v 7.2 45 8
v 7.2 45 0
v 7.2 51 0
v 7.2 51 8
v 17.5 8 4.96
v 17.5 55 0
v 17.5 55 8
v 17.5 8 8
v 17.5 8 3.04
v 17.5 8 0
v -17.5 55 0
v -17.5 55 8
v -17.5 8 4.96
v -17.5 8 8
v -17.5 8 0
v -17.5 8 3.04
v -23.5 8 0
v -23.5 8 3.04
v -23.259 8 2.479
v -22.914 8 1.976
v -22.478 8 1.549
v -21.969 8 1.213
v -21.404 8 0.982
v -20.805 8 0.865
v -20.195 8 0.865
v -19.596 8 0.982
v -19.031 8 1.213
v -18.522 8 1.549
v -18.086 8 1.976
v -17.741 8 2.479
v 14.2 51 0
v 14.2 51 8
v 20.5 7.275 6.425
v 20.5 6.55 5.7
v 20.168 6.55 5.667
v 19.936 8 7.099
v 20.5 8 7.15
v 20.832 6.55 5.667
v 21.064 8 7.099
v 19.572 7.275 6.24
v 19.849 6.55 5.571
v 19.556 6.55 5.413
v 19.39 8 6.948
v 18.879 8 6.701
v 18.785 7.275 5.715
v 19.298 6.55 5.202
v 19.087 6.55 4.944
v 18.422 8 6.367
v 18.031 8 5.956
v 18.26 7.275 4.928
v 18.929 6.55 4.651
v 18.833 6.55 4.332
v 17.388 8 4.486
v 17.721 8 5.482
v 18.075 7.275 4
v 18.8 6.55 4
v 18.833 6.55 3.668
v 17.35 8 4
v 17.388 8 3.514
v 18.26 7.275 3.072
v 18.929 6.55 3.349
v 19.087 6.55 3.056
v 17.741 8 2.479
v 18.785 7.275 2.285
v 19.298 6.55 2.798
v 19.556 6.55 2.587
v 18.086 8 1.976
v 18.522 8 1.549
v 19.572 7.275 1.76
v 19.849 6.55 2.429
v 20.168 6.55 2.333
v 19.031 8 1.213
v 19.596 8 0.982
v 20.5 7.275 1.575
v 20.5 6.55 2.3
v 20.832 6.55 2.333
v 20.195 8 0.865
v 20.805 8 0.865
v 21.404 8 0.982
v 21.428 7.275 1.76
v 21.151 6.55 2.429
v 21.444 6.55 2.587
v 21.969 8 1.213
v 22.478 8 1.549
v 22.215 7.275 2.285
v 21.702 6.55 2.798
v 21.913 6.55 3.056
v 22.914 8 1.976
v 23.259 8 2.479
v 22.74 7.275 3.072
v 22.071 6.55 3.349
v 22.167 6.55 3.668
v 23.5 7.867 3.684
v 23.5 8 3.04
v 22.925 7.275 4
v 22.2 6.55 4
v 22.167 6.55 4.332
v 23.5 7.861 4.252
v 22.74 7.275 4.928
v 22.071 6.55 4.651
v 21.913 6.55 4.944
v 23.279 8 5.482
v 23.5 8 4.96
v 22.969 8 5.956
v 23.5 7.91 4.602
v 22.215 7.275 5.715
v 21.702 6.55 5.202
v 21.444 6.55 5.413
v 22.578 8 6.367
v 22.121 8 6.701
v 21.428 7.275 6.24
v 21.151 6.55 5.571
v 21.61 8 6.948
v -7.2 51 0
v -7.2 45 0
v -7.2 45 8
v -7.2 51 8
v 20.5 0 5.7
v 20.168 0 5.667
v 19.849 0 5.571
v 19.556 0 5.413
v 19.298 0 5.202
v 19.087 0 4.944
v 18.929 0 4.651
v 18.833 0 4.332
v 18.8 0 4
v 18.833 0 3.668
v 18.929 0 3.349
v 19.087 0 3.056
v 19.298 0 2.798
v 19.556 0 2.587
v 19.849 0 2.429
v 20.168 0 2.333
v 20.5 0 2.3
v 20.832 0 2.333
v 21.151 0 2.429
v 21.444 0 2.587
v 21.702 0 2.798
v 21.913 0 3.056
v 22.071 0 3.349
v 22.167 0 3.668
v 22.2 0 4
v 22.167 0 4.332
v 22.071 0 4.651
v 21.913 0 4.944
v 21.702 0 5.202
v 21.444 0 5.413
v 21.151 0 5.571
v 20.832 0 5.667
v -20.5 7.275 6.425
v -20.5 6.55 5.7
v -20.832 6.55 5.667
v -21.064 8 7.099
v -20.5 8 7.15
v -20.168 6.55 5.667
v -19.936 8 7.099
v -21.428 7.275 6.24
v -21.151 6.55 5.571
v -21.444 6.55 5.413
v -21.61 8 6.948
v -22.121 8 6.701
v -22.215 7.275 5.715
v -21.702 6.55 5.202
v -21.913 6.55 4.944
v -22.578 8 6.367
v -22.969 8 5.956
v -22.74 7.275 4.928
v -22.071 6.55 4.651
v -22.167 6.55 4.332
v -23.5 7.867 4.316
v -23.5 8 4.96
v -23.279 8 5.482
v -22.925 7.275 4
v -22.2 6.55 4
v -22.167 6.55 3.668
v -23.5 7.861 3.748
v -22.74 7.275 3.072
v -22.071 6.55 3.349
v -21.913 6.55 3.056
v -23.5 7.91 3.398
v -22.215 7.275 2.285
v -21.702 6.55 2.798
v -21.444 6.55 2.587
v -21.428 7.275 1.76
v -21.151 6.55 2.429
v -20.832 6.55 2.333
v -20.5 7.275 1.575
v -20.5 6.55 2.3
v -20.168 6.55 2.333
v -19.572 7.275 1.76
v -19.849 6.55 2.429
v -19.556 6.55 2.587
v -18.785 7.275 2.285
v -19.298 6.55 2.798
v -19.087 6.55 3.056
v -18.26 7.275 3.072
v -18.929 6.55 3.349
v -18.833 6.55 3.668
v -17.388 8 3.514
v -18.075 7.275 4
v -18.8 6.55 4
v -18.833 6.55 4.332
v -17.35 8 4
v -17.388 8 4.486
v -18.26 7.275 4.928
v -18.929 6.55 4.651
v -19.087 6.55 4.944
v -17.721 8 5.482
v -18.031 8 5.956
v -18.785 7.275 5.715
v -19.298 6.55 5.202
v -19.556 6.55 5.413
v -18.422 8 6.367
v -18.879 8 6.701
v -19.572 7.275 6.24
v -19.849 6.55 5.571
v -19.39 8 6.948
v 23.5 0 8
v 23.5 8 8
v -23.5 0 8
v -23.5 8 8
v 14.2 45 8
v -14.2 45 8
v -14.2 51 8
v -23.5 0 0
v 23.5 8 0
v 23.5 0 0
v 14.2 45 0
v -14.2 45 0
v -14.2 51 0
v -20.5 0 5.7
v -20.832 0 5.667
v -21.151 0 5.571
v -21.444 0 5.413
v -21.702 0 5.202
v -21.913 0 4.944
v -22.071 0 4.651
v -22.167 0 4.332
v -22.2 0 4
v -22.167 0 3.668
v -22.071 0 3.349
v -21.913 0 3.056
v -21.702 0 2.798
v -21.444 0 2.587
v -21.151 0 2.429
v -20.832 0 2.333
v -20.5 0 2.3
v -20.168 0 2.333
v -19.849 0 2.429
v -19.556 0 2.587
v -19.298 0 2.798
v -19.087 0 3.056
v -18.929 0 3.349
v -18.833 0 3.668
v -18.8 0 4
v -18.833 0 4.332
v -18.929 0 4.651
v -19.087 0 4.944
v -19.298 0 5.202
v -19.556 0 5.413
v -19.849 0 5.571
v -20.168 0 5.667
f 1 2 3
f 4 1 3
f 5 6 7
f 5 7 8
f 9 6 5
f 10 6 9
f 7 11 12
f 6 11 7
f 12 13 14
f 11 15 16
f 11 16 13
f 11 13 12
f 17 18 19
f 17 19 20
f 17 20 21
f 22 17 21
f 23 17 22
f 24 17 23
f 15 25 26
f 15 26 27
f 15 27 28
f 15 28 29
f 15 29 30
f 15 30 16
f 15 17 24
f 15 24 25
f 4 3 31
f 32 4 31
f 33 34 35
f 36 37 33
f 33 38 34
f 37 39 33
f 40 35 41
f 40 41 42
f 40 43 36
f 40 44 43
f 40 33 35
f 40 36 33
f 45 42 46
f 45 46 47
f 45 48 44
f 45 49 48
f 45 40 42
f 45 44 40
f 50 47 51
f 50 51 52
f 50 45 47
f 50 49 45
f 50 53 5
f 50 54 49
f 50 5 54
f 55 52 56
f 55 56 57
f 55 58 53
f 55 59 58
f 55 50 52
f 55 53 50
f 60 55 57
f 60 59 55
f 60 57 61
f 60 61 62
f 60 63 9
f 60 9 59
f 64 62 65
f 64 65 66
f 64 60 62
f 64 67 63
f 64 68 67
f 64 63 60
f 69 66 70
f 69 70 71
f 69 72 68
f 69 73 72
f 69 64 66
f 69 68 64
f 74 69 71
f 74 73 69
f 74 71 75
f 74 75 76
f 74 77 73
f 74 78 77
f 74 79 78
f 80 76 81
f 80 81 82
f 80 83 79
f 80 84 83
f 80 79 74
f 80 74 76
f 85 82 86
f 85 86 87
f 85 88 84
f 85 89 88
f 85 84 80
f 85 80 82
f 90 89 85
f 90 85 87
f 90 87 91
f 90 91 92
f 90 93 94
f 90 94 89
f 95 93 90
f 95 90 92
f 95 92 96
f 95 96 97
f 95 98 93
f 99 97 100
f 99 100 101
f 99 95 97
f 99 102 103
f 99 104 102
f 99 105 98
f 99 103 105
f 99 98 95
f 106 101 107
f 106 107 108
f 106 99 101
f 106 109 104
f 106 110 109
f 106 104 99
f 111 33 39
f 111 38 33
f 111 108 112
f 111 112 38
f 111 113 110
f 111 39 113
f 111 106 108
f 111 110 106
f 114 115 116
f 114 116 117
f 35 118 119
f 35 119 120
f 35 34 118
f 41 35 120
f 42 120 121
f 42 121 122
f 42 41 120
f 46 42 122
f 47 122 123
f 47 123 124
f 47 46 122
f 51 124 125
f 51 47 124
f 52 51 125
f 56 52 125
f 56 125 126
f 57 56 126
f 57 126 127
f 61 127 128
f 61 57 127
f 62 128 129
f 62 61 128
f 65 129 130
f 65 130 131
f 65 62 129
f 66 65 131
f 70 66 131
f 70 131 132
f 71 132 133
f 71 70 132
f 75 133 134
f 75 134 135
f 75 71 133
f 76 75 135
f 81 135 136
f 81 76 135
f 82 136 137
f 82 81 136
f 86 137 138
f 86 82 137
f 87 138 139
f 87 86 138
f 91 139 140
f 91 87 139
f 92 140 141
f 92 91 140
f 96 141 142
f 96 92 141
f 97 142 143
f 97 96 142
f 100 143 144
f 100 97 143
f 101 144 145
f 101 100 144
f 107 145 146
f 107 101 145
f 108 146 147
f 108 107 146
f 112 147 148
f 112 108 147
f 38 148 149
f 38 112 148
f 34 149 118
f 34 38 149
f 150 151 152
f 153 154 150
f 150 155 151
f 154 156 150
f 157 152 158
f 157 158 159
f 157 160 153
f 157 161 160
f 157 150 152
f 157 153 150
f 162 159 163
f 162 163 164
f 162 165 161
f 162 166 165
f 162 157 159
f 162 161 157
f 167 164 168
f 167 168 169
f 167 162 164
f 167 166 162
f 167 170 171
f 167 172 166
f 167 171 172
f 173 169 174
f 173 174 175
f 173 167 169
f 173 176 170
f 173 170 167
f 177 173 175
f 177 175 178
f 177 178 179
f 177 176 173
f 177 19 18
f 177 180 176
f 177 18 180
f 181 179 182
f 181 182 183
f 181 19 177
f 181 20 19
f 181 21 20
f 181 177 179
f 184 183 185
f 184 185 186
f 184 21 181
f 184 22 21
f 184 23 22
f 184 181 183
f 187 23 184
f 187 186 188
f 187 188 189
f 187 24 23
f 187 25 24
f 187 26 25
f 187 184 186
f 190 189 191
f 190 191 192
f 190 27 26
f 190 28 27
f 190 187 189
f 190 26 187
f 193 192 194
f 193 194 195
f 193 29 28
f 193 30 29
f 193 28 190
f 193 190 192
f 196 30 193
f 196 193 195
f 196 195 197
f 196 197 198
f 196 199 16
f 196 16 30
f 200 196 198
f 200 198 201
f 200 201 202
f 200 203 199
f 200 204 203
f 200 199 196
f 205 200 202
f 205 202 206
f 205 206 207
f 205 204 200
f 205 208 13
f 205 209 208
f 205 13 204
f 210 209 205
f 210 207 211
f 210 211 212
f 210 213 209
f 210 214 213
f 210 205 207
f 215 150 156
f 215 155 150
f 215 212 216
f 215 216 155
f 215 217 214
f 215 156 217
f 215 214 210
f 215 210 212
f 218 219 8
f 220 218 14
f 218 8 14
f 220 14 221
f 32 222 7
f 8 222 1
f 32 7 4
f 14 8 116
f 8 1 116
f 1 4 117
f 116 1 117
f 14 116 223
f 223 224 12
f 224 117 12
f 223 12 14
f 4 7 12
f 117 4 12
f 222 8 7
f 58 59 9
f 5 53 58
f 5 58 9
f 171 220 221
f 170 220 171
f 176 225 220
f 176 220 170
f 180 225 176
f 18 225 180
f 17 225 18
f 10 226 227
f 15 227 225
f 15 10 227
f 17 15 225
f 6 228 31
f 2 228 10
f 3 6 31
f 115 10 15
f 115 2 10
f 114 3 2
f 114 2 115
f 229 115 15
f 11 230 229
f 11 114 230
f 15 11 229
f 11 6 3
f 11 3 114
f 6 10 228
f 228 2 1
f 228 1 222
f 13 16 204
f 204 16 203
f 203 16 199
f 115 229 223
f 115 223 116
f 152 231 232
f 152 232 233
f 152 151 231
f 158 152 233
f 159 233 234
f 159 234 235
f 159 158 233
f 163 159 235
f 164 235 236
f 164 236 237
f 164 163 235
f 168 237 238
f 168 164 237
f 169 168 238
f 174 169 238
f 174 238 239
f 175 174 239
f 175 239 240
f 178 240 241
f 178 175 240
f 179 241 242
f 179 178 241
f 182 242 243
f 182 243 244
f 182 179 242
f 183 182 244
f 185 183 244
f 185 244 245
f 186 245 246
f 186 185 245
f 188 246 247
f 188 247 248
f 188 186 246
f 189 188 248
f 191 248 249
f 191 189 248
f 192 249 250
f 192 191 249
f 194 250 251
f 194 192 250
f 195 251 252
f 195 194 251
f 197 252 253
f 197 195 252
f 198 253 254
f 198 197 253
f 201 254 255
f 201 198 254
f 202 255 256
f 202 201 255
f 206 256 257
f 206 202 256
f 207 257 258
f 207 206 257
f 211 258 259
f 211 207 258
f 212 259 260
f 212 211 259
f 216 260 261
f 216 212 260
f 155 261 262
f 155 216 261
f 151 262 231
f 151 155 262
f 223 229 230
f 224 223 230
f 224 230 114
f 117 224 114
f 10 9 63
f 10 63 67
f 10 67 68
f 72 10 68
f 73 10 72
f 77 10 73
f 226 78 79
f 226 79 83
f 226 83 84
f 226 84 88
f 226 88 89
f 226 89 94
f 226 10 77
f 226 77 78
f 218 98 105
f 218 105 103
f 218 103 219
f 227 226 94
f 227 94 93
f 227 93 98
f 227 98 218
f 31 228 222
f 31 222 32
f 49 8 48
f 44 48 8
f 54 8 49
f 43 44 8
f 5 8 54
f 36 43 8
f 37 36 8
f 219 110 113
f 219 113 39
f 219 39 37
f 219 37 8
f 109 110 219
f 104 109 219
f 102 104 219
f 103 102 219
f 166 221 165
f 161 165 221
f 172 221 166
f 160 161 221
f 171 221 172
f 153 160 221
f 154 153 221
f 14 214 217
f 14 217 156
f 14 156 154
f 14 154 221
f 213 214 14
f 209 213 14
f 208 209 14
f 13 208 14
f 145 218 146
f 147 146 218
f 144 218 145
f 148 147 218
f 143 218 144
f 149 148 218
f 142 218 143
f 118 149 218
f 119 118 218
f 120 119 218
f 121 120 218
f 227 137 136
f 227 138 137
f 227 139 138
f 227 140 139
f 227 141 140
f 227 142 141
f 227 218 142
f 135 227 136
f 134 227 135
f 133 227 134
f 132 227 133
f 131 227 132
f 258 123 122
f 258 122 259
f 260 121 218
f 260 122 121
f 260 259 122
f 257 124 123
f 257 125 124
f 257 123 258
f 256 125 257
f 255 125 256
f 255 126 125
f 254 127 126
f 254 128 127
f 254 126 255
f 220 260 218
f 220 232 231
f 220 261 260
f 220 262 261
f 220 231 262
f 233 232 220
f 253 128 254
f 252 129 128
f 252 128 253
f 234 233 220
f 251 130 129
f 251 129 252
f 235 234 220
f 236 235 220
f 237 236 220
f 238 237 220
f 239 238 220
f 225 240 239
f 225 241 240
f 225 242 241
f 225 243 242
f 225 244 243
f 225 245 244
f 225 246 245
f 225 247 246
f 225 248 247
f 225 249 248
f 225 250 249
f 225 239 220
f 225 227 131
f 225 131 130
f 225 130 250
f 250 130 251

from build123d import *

# Parameters (mm, degrees)
SKETCH2_W                                      = 7
SKETCH2_H                                      = 6
BOSS_EXTRUDE1_DEPTH                            = 8
CSK_FOR_M3_FLAT_HEAD_MACHINE_SCREW1_AT_2_COUNT = 2
CSK_FOR_M3_FLAT_HEAD_MACHINE_SCREW1_AT_2_PITCH = 41


with BuildPart() as part:
    # Sketch2 → Boss-Extrude1 (new body)
    with BuildSketch(Plane.XY):
        Polygon((23.5, 0), (-23.5, 0), (-23.5, 8), (-17.5, 8), (-17.5, 55), (17.5, 55), (17.5, 8), (23.5, 8), align=None)
        with Locations((10.7, 48)):
            Rectangle(SKETCH2_W, SKETCH2_H, mode=Mode.SUBTRACT)
        with Locations((-10.7, 48)):
            Rectangle(SKETCH2_W, SKETCH2_H, mode=Mode.SUBTRACT)
    extrude(amount=BOSS_EXTRUDE1_DEPTH)

    # Sketch4 → CSK for M3 Flat Head Machine Screw1 (revolve, cut)
    with BuildSketch(Plane(origin=(-20.5, 8, 4), x_dir=(0, 0, 1), z_dir=(1, 0, 0))):
        Polygon((0, 0), (0, 8), (1.7, 8), (1.7, 1.45), (3.15, 0), align=None)
    csk_for_m3_flat_head_machine_screw1 = revolve(axis=Axis((-20.5, 14.35, 4), (0, -1, 0)), mode=Mode.SUBTRACT)

    # CSK for M3 Flat Head Machine Screw1 at 2: CSK for M3 Flat Head Machine Screw1 ×2
    with Locations(*[(i * CSK_FOR_M3_FLAT_HEAD_MACHINE_SCREW1_AT_2_PITCH, 0, 0) for i in range(1, CSK_FOR_M3_FLAT_HEAD_MACHINE_SCREW1_AT_2_COUNT)]):
        add(csk_for_m3_flat_head_machine_screw1, mode=Mode.SUBTRACT)


solid = part.part
